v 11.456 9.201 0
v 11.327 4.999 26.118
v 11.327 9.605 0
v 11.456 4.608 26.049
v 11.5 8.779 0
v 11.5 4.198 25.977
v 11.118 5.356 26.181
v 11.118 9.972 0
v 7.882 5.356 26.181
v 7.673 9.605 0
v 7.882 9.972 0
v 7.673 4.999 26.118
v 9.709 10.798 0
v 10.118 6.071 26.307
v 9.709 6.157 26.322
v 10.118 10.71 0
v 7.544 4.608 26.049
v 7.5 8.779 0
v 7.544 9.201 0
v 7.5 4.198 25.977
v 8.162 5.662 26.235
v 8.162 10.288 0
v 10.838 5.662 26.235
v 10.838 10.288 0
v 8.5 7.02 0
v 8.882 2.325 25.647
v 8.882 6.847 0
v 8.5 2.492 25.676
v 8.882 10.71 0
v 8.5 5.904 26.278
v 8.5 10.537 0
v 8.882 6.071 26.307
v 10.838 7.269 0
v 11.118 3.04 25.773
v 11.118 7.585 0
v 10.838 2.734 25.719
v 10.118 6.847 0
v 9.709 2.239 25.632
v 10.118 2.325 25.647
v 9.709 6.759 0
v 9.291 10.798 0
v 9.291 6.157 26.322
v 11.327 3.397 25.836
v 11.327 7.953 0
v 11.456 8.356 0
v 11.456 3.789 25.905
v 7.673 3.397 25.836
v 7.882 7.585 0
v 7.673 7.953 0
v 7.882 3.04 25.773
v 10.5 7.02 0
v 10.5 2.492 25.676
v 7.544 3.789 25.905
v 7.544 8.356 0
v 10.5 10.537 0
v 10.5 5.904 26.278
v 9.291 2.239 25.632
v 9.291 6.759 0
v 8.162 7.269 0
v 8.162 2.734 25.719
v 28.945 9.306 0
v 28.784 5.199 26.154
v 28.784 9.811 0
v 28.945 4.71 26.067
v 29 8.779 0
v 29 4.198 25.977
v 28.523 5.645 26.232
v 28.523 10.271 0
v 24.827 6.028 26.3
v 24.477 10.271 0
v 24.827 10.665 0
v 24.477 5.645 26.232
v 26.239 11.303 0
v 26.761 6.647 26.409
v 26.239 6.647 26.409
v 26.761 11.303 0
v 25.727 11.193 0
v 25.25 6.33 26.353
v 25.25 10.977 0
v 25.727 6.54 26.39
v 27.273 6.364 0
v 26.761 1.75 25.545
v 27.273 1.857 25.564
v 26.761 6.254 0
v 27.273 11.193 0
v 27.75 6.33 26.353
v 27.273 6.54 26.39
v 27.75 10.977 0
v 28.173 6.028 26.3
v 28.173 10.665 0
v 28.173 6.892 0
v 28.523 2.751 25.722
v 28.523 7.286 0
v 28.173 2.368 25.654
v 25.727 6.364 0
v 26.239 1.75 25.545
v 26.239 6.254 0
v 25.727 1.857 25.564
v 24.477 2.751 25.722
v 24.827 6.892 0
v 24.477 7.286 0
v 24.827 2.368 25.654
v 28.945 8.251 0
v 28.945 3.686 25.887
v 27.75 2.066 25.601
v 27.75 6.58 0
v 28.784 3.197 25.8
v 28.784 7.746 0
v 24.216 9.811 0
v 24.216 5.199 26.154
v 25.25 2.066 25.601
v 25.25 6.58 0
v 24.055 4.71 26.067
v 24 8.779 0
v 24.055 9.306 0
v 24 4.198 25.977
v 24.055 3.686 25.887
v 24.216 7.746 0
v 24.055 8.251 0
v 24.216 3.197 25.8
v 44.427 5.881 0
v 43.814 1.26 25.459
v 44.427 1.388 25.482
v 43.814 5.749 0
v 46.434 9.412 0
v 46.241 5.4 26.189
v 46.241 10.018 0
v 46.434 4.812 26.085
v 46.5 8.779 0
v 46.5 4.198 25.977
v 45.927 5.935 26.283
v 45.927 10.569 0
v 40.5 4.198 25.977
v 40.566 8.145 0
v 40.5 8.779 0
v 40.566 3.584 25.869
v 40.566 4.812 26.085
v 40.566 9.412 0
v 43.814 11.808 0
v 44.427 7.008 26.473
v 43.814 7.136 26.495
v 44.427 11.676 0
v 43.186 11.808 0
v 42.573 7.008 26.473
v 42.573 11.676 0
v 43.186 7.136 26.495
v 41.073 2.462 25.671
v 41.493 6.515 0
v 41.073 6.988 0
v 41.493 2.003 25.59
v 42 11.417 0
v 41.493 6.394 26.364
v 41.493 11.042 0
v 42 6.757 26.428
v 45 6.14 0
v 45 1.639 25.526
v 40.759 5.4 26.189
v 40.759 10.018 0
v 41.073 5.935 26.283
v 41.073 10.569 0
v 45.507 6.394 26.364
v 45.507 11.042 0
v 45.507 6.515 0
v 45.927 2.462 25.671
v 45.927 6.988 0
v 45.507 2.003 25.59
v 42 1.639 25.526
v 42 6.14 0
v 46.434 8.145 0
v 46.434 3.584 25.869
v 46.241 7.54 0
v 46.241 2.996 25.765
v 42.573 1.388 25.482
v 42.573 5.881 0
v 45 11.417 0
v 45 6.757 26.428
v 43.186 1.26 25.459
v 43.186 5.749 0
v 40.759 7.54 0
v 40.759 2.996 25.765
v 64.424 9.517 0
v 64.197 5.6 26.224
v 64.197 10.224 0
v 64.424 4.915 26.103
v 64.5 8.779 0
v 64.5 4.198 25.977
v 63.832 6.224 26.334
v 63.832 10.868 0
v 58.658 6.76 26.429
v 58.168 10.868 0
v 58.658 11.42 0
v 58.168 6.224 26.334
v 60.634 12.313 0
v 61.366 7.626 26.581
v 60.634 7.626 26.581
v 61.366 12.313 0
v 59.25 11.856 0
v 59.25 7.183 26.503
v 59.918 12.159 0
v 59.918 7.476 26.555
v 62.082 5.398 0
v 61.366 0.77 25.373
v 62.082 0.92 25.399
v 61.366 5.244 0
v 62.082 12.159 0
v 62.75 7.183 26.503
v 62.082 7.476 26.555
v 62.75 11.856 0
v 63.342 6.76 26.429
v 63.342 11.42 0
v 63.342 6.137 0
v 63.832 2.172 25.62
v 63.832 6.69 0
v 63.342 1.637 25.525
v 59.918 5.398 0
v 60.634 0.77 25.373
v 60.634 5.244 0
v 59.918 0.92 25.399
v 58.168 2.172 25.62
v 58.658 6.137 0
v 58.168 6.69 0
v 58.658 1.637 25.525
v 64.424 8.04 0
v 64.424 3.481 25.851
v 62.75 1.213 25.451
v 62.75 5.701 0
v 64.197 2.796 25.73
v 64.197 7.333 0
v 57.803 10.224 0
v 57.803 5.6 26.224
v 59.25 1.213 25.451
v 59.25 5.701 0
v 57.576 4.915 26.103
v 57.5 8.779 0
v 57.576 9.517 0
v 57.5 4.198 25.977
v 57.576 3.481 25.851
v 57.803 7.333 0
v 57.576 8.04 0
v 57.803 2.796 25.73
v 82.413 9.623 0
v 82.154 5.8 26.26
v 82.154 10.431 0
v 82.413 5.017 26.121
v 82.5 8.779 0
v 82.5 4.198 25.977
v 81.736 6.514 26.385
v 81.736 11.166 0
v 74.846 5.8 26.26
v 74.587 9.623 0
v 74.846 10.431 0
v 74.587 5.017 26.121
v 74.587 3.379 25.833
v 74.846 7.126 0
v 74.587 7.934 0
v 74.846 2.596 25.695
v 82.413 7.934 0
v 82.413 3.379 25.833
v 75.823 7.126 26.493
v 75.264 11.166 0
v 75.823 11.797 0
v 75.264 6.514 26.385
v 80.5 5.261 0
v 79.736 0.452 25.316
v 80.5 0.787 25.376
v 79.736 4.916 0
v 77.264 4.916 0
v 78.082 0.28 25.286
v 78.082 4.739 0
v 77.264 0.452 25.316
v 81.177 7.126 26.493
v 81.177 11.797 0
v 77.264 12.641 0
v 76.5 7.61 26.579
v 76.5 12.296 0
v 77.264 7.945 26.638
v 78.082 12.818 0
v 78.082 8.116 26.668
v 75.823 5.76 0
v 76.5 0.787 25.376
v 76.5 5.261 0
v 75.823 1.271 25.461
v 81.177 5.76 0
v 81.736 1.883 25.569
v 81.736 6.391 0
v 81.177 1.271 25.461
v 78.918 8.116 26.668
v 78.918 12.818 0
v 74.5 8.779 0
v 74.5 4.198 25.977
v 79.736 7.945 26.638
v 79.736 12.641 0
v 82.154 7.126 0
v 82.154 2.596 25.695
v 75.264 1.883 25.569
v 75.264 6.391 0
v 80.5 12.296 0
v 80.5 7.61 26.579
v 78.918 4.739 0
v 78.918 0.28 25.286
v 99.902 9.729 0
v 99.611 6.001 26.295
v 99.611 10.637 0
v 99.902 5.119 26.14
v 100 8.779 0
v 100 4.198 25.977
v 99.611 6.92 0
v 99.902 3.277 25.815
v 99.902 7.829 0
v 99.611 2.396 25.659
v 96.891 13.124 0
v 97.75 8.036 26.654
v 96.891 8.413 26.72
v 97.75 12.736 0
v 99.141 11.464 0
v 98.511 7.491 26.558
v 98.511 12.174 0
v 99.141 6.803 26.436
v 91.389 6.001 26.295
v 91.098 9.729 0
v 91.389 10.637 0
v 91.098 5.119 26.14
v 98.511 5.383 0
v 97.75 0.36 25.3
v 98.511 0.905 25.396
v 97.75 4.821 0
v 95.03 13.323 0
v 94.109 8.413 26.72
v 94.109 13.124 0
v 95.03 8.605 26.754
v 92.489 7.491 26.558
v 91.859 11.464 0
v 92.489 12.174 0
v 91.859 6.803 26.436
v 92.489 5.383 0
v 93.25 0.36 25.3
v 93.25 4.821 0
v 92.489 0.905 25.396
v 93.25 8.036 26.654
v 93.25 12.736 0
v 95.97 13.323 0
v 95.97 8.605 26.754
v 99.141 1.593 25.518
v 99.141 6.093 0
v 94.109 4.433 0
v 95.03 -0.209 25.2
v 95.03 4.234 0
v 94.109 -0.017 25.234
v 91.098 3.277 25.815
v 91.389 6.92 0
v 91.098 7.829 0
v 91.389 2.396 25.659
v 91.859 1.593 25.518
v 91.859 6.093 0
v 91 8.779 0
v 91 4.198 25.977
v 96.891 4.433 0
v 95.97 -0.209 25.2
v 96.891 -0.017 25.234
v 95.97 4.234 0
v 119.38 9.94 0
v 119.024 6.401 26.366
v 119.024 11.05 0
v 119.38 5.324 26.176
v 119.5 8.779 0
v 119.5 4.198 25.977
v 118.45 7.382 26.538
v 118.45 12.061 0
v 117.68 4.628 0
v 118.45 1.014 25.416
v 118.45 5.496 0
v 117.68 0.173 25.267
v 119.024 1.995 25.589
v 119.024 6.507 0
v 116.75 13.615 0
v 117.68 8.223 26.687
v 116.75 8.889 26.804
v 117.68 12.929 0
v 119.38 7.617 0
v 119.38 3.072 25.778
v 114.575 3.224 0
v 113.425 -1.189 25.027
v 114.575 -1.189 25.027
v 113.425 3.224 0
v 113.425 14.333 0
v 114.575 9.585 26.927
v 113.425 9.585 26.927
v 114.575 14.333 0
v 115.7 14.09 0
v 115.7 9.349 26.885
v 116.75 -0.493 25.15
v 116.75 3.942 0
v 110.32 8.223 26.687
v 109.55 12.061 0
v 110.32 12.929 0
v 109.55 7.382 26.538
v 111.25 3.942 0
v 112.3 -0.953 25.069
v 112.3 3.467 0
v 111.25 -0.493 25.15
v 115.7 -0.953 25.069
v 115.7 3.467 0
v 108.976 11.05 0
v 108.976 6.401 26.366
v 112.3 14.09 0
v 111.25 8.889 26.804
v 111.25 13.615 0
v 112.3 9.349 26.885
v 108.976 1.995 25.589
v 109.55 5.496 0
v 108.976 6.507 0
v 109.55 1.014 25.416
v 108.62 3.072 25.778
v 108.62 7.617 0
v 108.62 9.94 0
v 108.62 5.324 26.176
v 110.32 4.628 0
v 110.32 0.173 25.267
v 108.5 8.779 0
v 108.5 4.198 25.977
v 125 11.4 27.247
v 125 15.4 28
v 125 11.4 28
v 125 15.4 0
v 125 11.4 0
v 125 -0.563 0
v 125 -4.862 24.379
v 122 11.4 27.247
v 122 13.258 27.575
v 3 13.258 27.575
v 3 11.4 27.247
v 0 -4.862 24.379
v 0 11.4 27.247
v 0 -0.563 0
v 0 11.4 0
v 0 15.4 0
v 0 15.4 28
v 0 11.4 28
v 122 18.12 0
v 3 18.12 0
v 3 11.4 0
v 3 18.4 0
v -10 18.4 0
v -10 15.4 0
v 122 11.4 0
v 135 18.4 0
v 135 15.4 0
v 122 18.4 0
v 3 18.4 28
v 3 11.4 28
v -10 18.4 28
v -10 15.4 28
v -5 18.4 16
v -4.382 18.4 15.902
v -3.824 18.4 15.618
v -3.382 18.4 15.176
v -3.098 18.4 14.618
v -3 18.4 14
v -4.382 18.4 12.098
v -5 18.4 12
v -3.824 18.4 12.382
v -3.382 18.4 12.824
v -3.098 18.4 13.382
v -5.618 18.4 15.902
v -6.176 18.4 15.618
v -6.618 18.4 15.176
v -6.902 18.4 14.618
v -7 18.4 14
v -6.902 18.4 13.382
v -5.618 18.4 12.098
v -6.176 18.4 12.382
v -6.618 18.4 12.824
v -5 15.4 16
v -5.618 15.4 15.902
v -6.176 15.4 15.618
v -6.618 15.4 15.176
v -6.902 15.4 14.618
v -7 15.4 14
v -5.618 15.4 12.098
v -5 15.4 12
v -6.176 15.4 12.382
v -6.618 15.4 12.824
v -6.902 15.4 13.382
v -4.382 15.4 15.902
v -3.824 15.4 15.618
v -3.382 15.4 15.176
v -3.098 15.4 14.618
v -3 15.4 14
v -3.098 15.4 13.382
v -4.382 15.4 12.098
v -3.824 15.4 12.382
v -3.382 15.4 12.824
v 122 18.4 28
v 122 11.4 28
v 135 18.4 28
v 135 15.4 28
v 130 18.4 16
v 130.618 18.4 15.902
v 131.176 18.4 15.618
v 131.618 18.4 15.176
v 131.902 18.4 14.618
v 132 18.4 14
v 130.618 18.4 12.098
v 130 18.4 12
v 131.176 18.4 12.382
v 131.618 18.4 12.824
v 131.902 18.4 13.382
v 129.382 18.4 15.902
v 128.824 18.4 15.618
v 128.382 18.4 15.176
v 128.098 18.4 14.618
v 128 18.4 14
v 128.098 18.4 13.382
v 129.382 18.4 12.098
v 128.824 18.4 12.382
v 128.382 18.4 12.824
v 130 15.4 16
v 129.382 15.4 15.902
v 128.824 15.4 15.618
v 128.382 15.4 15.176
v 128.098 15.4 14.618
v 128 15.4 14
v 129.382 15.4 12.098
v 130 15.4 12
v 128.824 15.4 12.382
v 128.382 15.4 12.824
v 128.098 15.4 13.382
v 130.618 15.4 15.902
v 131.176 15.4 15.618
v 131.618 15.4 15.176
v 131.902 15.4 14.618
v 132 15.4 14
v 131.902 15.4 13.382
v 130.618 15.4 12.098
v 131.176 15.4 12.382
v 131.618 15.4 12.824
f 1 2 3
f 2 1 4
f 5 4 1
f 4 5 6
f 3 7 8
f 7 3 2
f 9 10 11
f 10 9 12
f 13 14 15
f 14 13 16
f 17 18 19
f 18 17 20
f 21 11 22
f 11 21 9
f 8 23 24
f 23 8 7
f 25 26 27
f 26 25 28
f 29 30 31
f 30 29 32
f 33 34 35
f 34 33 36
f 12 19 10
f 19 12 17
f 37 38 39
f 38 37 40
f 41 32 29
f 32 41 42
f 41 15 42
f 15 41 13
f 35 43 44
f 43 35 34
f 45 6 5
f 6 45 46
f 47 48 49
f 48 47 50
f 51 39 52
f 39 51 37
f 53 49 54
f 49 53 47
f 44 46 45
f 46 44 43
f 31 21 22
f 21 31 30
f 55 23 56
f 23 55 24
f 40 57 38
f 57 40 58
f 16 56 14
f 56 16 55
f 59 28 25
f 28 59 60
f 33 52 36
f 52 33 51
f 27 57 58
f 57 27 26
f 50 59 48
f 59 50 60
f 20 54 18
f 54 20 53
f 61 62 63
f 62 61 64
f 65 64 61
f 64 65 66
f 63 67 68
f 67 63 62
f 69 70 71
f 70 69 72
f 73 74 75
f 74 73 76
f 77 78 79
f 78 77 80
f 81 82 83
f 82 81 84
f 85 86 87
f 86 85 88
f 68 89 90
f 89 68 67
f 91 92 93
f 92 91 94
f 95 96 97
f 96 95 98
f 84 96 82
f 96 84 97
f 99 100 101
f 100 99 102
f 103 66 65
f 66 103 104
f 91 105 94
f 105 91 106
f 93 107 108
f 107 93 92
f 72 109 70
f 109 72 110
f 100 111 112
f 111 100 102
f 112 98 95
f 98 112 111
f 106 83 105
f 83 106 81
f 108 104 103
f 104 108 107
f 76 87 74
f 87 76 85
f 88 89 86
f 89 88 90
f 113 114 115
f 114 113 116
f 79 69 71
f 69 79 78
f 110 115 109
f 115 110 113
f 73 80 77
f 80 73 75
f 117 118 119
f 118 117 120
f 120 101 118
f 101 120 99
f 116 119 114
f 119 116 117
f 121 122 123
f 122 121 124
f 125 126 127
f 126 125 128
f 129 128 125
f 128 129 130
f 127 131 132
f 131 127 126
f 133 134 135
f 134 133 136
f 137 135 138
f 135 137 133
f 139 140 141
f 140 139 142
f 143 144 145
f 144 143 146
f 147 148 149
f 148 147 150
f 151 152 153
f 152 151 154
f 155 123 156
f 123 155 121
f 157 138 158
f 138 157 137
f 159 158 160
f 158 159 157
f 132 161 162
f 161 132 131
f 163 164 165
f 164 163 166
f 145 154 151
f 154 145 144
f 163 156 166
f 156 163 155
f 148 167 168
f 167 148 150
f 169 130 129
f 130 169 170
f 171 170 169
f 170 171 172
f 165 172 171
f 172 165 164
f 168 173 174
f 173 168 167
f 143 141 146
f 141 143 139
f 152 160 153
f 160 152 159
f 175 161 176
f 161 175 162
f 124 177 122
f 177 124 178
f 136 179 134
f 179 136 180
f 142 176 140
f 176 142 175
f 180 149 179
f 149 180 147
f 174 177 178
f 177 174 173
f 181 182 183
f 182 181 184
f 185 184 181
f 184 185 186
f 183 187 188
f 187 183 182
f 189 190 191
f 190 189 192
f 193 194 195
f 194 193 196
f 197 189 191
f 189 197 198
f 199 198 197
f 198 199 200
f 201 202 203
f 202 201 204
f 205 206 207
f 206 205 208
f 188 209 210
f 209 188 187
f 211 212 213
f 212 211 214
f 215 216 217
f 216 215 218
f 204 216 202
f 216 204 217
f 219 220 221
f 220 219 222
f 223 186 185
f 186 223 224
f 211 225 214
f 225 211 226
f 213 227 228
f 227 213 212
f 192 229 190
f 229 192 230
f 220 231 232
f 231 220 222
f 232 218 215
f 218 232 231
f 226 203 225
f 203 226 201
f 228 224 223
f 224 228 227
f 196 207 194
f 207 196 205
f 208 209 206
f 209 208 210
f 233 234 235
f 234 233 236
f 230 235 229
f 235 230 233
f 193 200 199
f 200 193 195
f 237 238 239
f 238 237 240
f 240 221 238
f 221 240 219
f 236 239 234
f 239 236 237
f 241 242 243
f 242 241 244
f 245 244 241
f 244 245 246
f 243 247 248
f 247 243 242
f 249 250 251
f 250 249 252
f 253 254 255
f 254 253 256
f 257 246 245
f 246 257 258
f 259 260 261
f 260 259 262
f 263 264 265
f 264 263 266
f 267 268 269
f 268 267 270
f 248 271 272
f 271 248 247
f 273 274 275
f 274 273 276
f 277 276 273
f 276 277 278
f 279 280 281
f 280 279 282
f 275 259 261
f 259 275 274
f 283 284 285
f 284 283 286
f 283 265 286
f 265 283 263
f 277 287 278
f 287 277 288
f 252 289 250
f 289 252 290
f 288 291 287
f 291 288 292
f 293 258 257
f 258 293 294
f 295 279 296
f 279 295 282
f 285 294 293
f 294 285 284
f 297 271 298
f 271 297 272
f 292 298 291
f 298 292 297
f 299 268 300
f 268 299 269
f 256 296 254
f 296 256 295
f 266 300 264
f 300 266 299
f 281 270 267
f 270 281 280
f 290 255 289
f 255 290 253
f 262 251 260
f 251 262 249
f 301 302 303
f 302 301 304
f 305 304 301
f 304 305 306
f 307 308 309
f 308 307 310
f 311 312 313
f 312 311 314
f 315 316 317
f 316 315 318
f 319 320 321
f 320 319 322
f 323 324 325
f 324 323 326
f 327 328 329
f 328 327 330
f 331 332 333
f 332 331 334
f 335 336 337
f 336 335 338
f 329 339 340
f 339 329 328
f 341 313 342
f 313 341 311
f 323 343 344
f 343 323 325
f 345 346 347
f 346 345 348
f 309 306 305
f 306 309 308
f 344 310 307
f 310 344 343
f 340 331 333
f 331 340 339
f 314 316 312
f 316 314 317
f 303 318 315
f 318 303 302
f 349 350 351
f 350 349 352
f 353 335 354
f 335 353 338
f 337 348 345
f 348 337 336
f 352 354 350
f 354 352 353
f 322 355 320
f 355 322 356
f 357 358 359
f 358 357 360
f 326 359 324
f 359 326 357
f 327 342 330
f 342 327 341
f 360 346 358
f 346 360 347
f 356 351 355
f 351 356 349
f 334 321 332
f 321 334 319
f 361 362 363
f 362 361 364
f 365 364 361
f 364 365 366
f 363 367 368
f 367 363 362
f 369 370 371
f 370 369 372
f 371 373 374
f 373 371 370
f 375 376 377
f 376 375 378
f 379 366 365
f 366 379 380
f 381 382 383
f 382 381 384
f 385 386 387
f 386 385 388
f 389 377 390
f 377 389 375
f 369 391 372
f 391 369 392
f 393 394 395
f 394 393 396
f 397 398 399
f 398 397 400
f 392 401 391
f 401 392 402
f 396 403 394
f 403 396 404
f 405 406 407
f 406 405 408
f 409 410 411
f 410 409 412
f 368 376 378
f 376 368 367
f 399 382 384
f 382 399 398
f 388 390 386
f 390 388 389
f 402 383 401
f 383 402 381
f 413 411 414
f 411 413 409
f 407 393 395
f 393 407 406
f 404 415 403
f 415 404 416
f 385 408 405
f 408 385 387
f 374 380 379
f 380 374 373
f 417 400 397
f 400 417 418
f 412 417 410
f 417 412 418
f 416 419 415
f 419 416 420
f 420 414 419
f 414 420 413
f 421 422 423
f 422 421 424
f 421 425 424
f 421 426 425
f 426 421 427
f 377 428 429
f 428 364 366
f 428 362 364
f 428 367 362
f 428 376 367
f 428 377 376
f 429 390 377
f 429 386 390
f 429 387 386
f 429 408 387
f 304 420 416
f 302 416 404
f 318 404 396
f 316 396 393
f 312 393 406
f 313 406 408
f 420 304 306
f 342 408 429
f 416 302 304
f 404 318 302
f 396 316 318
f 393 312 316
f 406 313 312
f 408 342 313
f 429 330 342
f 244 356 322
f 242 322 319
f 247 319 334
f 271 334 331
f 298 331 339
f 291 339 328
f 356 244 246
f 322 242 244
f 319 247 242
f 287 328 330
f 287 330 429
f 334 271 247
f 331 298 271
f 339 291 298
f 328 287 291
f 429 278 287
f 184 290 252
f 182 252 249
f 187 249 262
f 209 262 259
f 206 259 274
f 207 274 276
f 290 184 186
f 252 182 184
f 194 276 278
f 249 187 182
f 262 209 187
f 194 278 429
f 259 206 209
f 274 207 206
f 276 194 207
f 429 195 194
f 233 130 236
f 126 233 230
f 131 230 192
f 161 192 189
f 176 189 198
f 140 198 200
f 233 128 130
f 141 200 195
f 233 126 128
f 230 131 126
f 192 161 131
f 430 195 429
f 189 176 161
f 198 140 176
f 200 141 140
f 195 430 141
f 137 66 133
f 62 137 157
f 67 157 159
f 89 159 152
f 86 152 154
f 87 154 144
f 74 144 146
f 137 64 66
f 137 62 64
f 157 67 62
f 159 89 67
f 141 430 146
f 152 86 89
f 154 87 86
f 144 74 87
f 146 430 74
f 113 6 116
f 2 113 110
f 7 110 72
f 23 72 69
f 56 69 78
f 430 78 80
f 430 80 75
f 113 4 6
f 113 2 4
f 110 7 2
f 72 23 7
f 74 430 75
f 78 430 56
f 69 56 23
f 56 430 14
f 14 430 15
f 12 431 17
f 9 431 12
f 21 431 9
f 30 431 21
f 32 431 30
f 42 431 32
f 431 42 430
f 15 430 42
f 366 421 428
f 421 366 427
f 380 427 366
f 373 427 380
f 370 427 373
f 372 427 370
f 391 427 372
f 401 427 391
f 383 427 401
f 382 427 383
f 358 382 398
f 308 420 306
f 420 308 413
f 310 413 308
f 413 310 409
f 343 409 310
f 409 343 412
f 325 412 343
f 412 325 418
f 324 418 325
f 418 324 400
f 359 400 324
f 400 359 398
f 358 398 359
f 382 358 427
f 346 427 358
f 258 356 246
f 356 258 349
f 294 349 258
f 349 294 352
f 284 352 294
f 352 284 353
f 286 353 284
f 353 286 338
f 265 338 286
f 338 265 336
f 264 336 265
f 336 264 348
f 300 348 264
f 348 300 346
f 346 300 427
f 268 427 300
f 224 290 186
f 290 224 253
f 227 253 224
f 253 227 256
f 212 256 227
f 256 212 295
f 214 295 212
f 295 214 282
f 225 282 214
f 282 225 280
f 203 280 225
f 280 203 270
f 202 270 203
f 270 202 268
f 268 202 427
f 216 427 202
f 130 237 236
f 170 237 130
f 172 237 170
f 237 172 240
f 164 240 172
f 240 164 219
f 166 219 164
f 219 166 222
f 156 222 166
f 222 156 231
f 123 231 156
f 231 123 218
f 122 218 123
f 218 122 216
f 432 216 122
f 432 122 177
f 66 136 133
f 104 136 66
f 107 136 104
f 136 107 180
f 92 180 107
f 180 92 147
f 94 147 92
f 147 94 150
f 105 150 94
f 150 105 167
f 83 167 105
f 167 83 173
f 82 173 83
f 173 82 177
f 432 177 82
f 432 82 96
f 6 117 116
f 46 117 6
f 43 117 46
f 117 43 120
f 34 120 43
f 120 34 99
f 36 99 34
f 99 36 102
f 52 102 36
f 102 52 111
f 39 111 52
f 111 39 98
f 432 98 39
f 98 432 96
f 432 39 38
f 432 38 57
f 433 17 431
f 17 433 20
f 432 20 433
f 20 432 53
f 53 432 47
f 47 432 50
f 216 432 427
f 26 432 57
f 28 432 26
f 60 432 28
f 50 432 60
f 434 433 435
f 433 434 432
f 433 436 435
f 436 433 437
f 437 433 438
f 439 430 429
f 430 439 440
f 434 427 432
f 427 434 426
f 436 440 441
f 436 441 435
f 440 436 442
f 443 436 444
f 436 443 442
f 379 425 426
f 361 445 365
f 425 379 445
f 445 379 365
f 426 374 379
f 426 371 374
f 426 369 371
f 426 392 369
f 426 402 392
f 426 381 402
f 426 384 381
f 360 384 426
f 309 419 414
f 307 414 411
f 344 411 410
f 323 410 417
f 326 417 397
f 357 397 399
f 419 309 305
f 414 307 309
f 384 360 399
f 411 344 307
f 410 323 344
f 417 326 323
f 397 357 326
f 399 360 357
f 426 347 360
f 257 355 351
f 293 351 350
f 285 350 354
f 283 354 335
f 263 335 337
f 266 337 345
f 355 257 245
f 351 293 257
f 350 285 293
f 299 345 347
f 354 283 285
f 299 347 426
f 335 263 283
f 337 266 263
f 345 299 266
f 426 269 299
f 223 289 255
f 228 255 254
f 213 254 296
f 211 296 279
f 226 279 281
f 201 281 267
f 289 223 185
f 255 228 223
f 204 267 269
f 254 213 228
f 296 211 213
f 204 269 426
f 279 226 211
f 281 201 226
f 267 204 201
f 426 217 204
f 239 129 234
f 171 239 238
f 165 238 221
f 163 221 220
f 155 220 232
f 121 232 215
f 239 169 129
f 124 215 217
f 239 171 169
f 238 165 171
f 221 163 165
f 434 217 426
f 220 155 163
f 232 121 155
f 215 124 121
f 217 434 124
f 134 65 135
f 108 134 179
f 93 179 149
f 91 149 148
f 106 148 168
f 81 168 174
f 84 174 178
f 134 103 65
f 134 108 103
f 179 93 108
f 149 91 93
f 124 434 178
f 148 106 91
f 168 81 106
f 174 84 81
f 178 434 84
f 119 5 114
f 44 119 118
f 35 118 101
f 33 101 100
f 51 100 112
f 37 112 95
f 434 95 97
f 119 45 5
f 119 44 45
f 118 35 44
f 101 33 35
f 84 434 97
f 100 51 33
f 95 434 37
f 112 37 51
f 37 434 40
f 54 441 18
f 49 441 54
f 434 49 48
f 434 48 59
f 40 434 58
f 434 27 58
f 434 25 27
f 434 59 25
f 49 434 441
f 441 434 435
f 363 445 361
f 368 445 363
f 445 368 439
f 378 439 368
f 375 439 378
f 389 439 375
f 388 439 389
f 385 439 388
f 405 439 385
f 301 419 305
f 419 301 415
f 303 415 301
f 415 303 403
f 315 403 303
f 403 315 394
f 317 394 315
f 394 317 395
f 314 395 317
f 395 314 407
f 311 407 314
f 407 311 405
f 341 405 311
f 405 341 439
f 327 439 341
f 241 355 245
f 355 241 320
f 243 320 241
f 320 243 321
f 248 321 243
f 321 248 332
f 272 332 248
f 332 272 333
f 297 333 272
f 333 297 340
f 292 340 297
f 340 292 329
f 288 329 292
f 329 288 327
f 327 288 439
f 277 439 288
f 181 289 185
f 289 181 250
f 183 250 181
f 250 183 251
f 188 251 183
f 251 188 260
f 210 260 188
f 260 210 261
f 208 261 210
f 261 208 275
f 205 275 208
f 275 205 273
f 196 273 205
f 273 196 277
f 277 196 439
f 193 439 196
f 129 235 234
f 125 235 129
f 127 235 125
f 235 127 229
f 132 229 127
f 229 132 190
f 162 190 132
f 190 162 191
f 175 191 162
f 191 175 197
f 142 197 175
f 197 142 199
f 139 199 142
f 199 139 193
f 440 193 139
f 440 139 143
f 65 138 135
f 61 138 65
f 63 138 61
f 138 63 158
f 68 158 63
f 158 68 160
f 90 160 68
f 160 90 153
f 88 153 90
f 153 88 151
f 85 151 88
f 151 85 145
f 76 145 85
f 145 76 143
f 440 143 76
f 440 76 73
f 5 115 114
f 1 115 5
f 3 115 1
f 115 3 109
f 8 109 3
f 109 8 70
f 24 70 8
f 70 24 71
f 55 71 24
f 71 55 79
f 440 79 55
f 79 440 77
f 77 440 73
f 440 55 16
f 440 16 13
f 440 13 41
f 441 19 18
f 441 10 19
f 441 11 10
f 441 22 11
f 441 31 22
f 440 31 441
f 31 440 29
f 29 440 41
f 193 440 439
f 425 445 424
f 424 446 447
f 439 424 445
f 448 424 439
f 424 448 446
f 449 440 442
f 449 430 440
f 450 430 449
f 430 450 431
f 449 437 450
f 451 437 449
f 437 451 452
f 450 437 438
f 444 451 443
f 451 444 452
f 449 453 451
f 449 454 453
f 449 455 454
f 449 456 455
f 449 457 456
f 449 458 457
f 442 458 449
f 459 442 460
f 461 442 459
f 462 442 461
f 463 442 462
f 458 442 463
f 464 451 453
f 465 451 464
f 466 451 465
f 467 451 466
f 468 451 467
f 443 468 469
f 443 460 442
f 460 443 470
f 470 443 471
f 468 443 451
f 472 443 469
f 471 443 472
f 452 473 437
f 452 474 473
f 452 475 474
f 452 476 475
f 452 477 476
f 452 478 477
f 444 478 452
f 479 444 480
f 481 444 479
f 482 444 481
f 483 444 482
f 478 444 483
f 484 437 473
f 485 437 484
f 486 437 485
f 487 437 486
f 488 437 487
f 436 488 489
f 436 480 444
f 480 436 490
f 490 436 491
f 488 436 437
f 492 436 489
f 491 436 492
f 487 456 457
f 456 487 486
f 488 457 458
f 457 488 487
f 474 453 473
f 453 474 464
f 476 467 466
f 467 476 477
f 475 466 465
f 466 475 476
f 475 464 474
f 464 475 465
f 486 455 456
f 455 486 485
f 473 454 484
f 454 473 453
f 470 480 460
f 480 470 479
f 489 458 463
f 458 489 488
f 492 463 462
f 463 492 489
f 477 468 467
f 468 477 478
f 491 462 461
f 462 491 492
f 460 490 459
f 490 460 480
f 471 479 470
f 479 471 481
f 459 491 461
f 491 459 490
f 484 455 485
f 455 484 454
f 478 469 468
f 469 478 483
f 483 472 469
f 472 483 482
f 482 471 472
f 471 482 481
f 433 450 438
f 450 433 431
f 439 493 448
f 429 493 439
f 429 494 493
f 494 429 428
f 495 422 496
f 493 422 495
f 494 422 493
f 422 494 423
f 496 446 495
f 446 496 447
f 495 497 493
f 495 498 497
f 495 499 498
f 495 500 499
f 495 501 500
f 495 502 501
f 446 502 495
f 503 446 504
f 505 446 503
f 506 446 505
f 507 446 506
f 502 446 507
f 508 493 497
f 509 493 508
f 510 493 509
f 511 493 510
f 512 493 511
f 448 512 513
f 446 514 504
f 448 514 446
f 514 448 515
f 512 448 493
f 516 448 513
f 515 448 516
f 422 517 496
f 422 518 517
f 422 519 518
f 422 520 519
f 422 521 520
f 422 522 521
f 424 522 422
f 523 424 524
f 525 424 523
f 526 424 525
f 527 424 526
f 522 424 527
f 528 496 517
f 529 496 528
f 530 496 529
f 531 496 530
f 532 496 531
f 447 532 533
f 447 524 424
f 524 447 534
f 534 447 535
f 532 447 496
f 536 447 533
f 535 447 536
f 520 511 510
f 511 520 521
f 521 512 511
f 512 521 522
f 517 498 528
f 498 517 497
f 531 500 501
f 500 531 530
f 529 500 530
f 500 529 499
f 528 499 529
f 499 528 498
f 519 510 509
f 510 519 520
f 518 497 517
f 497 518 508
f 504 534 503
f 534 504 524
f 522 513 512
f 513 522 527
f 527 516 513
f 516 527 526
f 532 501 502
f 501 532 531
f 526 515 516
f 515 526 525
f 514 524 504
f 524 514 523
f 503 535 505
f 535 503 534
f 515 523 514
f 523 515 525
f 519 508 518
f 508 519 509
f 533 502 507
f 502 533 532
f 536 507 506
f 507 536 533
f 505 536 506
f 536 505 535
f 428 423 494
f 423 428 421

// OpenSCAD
// Soma elementos de um vetor:
function add( v, i = 0, r = 0 ) = len( v ) > i ? add( v, i + 1, r + v[ i ] ) : r;

esc_dias = [ 15, 15, 15, 16, 15, 15, 18 ];
bro_dias = [  3,  4,  5,  6,  7,  8, 10 ];

// Tolerância nos furos:
tol = 1.0;
// Diâmetros nos furos:
diams = [ for( d = bro_dias ) d + tol ];

// Separação entre os furos:
sep = 2;

// Altura do porta-brocas:
h = 28;

// Excesso em largura:
el = 2;

// Largura do porta-brocas:
l = max( esc_dias ) * 0.8 + 2 * el;

// Comprimento do porta-brocas:
c = add( esc_dias ) + sep * ( len( esc_dias ) + 1 );

// Ângulo das brocas:
a = 10;

difference(){
    translate( [ 0, 0, -sin( a ) * l ] )
        rotate( a, [ 1, 0, 0 ] )
            difference(){
                cube( [ c, l, h ] );
                for( i = [ 0 : len( diams ) - 1 ] )
                {
                    translate(
                        [
                            ( i + 1 ) * sep + add( [ for( j = [ 0 : i ] ) esc_dias[ j ] ] ) - esc_dias[ i ] / 2,
                            l / 2,
                            -1
                        ]
                    )
                        cylinder( d = diams[ i ], h = 3 * h, $fn = 30 );
                }
            }
    translate( [ -500, -500, -100 ] )
    cube( [ 1000, 1000, 100 ] );
}

aba_l = 10;
module aba()
{
    difference()
    {
        cube( [ aba_l + 3, 3, h ] );
        translate( [ aba_l / 2, 15, h / 2 ] )
            rotate( 90, [ 1, 0, 0 ] )
                cylinder( d = 4, h = 30, $fn = 20 );
    }
    translate( [ aba_l, -4, 0 ] )
        cube( [ 3, 7, h ] );
}
translate( [ -aba_l, l - 3, 0 ] )
    aba();
translate( [ c + aba_l, l - 3, 0 ] )
    mirror( [ 1, 0, 0 ] )
        aba();
